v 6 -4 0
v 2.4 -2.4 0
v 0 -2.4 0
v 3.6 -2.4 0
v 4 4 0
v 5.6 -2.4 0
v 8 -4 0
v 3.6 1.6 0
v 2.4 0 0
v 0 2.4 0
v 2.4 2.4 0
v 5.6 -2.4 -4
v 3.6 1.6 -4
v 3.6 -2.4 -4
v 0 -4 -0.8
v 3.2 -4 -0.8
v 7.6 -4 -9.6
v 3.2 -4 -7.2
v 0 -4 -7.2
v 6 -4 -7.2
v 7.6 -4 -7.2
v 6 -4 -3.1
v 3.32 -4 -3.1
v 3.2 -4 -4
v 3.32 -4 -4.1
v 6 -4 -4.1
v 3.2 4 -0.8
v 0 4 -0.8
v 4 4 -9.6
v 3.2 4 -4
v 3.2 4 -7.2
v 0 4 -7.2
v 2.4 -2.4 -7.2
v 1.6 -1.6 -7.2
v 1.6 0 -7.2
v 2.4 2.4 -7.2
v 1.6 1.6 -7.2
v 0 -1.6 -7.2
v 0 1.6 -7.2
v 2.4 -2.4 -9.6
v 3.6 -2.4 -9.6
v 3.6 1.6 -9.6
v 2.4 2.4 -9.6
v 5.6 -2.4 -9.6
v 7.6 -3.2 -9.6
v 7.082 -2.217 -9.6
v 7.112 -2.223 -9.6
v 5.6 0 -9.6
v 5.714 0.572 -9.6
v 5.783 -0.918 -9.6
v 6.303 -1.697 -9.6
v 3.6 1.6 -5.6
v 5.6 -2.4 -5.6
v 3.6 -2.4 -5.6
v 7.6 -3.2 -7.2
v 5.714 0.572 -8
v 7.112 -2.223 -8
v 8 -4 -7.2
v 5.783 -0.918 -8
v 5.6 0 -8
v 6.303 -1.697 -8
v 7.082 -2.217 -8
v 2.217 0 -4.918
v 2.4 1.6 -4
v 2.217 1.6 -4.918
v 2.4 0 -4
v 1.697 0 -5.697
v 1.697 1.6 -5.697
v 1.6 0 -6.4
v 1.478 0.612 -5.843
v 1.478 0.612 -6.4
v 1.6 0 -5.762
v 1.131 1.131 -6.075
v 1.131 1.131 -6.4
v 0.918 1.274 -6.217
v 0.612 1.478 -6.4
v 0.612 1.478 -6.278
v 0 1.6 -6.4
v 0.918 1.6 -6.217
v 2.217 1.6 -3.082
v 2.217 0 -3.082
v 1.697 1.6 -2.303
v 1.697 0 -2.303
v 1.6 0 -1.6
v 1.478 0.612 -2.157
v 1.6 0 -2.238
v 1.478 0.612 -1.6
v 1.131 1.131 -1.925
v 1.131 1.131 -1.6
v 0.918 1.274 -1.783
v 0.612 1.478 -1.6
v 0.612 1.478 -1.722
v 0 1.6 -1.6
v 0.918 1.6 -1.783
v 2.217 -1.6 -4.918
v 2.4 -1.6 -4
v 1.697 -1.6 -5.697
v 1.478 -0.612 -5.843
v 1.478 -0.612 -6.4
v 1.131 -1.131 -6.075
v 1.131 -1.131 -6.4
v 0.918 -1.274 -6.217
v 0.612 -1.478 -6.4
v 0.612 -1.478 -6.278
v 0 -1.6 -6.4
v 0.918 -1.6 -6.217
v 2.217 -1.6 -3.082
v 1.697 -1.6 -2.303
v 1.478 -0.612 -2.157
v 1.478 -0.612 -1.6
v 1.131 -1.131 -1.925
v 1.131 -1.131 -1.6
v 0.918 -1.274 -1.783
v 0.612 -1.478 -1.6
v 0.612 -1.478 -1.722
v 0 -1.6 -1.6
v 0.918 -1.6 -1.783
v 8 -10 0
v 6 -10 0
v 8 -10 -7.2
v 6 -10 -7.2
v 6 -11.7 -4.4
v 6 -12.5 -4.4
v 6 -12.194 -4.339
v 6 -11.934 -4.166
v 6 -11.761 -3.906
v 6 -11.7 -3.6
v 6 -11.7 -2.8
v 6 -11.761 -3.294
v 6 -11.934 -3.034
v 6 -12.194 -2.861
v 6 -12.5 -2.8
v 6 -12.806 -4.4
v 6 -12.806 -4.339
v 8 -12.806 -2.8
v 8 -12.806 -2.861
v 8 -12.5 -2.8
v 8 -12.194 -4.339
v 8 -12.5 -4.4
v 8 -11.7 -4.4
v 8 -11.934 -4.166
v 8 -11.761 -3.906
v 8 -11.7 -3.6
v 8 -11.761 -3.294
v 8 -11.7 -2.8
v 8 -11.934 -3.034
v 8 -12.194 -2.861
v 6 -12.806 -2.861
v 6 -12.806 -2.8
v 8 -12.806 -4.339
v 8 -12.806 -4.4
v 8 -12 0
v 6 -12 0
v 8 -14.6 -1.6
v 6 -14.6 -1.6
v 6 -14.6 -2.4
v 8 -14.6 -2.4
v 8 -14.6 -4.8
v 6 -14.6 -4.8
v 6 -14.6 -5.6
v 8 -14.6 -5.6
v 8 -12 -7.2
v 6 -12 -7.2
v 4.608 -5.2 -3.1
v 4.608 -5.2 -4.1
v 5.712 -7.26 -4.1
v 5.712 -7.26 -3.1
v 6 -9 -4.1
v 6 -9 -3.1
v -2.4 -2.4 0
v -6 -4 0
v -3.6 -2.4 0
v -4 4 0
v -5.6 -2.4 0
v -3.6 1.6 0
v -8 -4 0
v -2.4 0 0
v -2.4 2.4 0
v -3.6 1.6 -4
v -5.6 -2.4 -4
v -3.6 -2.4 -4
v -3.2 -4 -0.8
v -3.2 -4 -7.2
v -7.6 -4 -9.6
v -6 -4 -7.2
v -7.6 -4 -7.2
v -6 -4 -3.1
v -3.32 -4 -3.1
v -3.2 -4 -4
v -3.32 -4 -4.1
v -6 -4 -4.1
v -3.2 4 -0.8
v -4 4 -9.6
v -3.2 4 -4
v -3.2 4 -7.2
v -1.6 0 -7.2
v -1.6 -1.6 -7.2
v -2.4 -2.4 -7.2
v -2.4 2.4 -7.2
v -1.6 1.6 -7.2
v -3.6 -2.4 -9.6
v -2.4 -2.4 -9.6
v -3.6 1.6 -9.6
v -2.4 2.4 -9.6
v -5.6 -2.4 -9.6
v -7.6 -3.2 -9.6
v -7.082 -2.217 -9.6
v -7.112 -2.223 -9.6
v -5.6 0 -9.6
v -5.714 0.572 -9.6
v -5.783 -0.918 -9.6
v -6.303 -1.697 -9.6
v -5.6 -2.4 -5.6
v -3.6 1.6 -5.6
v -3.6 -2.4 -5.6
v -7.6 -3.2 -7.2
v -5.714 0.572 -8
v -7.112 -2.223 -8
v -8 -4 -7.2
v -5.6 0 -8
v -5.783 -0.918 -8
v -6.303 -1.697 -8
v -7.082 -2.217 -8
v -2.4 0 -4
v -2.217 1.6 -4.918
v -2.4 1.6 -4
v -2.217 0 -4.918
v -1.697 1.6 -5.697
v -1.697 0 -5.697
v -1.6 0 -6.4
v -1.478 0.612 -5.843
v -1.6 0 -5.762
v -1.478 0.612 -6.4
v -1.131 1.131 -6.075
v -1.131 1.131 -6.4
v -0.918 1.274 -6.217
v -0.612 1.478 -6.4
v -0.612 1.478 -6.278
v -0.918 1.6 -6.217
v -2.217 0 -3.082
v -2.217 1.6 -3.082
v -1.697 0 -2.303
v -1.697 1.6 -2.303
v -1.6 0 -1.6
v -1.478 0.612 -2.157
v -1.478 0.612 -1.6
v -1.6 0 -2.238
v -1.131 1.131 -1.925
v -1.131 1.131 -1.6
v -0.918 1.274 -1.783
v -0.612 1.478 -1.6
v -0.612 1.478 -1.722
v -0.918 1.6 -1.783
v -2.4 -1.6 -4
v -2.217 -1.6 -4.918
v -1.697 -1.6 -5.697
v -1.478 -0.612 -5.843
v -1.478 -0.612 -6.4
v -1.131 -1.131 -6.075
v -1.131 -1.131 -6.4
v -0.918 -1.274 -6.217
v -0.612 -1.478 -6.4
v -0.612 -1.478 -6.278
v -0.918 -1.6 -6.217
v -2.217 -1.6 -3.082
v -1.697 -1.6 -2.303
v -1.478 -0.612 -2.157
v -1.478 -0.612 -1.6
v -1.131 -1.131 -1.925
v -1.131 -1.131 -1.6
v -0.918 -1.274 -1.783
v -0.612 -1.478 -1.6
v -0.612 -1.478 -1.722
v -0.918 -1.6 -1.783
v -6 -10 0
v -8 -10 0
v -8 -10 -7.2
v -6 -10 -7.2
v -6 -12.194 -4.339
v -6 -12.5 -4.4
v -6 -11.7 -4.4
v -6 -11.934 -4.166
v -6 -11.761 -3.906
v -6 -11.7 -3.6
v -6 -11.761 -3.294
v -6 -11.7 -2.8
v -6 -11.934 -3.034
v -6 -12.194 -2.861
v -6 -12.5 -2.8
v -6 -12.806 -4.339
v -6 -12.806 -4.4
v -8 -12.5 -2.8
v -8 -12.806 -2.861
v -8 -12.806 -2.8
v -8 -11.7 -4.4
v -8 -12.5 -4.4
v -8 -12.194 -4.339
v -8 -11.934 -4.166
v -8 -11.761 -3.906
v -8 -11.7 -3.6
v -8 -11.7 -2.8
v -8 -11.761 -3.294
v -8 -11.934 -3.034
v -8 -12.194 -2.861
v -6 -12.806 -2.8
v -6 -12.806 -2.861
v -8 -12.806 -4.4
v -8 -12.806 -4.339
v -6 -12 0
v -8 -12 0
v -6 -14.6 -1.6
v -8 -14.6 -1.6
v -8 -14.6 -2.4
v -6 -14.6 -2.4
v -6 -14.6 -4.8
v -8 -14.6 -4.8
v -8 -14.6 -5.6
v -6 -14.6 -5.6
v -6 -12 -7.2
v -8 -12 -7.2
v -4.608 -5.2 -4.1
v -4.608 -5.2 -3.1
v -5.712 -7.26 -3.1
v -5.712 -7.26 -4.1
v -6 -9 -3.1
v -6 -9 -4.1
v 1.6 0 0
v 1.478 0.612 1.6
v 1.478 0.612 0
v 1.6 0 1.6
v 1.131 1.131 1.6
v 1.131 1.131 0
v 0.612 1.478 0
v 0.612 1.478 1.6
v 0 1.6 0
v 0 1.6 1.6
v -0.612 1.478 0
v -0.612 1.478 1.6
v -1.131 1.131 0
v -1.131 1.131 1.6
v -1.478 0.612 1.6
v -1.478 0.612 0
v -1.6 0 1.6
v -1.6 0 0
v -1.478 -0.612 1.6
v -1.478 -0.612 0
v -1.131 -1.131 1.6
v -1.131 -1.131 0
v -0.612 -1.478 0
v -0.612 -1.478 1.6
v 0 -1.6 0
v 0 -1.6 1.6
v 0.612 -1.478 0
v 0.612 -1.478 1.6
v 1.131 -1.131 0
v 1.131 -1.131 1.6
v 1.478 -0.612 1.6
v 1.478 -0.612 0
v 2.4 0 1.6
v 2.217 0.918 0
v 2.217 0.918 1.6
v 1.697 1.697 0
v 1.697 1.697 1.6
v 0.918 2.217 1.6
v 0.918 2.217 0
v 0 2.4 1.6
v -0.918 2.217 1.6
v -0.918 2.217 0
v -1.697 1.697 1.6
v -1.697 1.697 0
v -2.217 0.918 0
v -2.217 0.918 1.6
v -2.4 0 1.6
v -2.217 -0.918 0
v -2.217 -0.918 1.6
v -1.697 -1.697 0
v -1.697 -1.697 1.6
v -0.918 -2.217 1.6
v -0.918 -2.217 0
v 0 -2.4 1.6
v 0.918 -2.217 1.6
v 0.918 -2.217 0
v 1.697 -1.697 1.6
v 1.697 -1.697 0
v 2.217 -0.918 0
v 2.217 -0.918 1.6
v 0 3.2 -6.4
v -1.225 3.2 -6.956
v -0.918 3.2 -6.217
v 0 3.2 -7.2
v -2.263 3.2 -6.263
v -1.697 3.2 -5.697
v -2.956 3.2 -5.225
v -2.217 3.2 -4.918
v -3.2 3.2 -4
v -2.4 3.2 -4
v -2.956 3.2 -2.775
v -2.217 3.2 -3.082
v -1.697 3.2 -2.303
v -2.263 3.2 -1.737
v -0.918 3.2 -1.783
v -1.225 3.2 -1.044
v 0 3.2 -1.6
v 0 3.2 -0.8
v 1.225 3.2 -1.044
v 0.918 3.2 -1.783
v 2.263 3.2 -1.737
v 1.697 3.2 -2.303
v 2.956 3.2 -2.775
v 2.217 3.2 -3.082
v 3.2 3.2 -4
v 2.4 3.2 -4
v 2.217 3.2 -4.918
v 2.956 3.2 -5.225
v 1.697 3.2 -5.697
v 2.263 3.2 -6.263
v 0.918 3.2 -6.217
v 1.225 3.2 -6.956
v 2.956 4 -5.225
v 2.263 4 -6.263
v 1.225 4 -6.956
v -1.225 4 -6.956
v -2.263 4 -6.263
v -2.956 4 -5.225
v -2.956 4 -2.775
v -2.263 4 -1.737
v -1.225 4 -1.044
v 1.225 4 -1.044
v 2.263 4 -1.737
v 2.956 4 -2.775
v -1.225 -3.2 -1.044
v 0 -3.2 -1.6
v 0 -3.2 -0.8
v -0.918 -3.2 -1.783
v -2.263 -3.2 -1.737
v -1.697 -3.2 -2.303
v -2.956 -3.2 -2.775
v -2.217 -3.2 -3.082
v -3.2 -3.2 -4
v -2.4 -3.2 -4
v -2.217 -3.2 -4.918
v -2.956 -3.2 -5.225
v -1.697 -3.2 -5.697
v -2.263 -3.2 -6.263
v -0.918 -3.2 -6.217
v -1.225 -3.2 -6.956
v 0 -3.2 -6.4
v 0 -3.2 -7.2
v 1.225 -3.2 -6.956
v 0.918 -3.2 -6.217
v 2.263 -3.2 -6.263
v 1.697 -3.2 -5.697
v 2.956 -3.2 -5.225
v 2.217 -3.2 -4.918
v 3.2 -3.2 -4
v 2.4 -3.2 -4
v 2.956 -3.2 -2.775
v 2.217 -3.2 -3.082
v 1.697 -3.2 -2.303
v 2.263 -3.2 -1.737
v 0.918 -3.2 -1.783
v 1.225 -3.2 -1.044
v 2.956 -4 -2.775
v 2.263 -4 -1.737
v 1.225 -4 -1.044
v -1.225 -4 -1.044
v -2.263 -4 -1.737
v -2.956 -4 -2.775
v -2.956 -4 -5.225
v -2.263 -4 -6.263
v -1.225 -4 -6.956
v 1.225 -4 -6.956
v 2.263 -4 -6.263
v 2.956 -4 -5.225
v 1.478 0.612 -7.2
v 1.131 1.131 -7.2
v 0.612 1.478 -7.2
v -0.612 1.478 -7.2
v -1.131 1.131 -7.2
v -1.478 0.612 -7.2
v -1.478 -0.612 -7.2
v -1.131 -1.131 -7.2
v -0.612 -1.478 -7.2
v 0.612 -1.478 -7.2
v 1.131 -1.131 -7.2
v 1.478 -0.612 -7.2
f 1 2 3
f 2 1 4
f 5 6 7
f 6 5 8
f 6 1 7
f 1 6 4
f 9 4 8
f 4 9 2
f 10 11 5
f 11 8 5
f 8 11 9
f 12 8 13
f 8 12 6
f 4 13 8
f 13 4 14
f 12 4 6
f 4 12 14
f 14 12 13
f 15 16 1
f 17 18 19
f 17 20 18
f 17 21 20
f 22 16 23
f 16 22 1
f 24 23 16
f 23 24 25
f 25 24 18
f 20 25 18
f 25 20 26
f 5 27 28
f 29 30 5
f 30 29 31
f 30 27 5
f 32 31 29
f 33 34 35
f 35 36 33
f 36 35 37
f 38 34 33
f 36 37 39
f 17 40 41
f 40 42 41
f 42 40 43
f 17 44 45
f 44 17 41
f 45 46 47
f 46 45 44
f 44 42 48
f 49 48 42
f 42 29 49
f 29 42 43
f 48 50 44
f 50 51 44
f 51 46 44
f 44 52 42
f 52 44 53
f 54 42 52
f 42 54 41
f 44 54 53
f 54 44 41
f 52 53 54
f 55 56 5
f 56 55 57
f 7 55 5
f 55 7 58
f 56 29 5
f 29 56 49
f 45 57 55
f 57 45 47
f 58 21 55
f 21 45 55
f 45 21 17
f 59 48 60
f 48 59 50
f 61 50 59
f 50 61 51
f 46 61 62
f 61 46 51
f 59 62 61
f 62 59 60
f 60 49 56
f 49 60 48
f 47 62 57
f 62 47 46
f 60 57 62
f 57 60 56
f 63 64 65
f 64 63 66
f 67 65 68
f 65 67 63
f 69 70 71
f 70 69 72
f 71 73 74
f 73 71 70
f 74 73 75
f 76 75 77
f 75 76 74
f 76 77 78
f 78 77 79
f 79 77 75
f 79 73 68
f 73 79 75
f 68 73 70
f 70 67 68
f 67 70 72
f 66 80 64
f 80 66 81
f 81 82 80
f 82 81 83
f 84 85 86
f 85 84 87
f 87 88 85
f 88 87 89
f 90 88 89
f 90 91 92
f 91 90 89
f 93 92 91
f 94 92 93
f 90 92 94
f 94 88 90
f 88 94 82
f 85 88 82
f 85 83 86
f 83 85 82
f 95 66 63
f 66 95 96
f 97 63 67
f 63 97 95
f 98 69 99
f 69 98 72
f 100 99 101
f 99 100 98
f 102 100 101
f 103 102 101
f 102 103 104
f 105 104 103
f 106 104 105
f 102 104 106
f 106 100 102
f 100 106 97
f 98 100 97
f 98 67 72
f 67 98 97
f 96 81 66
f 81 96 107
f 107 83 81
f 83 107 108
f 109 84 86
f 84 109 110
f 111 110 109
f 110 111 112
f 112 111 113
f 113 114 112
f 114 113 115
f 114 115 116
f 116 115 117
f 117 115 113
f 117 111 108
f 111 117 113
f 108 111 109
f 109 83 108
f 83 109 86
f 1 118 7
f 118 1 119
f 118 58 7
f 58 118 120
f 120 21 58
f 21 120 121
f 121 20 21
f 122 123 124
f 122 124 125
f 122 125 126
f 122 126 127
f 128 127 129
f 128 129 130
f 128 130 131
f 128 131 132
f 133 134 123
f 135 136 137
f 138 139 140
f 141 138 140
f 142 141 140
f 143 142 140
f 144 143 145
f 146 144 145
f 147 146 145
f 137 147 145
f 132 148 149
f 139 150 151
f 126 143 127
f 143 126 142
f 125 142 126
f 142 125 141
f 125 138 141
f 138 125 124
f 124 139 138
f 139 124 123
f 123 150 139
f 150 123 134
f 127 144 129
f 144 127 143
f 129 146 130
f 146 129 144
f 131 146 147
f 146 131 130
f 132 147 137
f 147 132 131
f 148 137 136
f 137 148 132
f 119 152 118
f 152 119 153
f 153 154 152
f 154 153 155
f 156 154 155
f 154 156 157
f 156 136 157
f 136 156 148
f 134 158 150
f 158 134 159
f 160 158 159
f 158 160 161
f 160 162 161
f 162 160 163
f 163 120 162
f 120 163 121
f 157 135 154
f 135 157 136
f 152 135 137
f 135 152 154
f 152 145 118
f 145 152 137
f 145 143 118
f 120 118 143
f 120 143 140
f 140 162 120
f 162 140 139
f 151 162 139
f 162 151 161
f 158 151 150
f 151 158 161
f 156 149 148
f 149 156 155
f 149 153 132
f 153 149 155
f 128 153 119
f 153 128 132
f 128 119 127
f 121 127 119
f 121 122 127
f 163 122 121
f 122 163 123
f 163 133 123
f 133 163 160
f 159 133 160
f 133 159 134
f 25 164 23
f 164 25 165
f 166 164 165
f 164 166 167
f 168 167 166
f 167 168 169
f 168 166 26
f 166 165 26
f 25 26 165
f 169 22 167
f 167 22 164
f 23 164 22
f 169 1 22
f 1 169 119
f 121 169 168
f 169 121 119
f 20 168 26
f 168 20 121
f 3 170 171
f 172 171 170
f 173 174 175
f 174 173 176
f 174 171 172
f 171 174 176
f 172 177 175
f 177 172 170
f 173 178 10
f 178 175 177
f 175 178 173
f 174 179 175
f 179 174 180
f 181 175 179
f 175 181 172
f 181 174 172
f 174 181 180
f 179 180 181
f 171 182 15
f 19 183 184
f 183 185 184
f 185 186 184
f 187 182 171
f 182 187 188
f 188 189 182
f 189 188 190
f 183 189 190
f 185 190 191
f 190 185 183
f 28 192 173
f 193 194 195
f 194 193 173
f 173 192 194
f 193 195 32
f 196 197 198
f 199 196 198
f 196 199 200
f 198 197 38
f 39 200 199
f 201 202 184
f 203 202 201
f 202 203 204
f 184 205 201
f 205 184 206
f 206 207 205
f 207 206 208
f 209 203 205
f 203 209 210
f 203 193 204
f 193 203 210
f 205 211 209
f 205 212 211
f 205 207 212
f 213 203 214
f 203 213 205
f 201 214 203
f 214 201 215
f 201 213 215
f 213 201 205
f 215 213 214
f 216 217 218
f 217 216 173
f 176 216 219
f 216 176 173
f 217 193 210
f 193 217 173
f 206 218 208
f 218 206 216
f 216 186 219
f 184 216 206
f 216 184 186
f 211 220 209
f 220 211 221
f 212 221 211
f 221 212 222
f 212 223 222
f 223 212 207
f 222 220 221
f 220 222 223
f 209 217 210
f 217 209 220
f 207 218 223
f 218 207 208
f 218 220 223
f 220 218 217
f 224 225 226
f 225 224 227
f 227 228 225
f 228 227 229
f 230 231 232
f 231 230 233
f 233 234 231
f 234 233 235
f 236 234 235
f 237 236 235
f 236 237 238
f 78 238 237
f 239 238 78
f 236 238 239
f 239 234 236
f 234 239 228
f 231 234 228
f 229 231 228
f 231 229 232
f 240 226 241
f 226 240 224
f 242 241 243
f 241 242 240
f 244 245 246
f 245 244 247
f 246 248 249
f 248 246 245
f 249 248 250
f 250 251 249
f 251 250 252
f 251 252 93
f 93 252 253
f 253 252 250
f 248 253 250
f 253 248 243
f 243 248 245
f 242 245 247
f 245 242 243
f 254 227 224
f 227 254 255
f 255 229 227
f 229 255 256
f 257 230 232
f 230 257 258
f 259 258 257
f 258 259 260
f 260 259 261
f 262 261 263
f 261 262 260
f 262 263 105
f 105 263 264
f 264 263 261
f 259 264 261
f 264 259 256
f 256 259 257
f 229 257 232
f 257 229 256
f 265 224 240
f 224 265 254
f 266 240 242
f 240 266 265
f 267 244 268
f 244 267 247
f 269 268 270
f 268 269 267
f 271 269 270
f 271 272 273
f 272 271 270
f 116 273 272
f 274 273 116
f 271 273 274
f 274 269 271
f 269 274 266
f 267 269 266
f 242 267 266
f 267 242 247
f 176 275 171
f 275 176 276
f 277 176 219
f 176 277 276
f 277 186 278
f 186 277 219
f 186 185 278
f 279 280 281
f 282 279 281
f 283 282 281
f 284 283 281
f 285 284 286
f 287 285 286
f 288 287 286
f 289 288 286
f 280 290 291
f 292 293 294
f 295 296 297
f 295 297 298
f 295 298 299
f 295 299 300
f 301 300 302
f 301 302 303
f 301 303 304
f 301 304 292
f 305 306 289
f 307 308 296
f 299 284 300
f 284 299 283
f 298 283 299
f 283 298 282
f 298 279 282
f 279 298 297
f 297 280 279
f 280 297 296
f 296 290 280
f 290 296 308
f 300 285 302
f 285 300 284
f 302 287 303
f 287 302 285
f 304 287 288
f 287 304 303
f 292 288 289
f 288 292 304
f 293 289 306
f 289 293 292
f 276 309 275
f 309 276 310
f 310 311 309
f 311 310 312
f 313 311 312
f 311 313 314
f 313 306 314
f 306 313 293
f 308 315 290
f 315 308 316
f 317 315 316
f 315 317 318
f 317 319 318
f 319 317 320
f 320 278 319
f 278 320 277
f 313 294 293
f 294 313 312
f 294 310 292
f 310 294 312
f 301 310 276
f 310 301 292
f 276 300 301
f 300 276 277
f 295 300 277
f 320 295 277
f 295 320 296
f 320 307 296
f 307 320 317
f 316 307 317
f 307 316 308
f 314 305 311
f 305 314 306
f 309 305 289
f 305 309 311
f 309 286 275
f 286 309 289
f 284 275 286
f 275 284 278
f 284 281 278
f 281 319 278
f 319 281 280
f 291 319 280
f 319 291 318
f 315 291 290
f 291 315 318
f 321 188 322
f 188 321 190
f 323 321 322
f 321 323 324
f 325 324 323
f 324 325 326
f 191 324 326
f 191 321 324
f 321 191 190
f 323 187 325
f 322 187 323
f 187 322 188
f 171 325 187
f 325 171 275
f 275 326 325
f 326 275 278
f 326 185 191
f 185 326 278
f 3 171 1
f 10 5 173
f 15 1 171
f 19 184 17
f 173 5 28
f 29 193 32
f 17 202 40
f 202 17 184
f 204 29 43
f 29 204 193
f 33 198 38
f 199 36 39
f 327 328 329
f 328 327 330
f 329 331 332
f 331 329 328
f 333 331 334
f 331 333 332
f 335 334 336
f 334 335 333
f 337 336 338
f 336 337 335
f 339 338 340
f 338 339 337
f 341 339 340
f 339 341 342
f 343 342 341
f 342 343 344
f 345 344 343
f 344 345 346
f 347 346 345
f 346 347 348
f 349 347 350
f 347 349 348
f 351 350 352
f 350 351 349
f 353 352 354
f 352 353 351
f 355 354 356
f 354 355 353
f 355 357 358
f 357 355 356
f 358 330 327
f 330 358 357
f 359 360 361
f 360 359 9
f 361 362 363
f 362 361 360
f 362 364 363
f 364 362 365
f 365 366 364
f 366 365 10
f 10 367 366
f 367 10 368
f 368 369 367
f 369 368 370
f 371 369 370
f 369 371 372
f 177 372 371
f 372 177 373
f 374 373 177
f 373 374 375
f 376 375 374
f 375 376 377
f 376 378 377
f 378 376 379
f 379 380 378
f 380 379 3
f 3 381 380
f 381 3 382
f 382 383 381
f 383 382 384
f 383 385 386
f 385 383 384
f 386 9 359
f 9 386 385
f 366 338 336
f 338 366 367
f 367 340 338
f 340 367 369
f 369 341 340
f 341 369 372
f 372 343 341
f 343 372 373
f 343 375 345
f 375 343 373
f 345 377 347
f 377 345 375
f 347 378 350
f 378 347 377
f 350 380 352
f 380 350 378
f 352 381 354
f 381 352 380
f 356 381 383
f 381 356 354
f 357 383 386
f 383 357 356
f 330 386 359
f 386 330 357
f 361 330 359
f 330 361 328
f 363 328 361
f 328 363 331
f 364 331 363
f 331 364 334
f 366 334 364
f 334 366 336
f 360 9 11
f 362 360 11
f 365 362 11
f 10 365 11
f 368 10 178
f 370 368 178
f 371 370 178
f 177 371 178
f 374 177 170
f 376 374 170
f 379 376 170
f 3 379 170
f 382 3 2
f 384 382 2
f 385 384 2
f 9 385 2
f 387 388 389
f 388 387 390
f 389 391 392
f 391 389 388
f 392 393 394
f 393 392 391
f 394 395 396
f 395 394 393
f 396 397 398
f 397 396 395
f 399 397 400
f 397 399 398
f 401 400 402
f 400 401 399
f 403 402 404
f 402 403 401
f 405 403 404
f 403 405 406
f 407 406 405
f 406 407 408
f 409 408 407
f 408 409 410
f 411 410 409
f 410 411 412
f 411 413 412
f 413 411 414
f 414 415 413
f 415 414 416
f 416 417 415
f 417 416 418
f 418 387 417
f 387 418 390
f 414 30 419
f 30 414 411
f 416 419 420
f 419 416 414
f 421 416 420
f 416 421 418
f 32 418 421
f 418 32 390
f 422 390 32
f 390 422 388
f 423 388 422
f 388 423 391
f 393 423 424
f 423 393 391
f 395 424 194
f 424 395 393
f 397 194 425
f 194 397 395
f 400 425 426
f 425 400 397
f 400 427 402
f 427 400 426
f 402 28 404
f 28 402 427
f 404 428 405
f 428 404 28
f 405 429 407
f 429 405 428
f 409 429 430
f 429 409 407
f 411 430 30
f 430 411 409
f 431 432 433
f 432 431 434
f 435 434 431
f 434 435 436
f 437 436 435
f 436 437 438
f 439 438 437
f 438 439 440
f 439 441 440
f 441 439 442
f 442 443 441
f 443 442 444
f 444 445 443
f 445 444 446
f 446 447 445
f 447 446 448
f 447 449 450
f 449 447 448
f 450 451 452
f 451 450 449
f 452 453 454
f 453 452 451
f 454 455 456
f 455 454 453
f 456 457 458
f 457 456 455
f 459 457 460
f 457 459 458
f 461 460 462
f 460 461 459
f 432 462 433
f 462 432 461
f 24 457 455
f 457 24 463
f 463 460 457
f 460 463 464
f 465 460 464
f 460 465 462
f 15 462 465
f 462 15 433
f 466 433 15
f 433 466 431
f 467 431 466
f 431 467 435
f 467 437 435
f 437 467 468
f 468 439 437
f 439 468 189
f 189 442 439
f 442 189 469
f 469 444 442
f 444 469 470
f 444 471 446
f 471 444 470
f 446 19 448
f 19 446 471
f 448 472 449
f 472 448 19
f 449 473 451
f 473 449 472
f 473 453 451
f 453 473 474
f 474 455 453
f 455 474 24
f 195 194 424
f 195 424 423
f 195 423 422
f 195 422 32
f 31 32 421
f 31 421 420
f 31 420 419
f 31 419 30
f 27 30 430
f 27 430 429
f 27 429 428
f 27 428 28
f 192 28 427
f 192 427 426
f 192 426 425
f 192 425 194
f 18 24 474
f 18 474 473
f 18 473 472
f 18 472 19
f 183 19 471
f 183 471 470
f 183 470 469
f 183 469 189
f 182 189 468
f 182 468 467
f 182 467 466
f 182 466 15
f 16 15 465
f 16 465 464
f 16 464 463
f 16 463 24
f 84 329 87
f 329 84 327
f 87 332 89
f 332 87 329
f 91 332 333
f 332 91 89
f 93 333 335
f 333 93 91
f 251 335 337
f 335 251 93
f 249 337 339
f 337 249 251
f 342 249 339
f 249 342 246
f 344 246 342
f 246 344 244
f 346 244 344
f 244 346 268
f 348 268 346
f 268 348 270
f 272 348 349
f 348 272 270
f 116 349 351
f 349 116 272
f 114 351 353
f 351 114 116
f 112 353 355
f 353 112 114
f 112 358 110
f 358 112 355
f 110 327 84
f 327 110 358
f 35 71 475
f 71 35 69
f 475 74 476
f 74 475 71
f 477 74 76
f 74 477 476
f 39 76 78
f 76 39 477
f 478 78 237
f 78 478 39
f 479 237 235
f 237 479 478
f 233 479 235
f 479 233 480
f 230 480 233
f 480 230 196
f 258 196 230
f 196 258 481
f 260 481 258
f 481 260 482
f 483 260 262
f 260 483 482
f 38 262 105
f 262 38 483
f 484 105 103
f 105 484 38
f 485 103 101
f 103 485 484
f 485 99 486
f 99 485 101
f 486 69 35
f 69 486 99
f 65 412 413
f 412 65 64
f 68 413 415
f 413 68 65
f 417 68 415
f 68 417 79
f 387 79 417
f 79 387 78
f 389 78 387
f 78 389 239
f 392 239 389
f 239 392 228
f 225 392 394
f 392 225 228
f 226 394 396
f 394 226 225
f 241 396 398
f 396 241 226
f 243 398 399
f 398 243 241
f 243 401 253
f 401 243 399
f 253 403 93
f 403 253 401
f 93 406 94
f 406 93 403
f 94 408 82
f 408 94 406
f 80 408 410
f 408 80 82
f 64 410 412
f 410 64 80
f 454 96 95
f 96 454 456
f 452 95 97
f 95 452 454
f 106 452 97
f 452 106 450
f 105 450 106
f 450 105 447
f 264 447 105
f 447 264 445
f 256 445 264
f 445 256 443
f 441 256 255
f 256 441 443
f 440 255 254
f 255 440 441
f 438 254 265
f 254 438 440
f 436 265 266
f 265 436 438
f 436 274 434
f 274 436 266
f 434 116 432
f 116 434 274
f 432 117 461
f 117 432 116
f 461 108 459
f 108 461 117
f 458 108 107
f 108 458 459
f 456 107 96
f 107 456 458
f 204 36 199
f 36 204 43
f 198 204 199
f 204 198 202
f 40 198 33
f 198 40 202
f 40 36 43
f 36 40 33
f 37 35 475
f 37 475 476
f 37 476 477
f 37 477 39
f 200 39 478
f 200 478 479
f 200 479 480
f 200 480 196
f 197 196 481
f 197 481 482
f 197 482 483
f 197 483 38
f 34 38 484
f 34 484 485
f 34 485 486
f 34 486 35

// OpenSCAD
use <../lib.scad>
use <../p/4-4cyli.scad>
use <../p/4-4edge.scad>
use <../p/4-4ndis.scad>
use <../p/box4.scad>
use <../p/peghole.scad>
use <s/2607bs01.scad>
use <../p/stud2a.scad>
function ldraw_lib__2607b() = [
// 0 Magnet Holder  2 x  3 Technic Brick
// 0 Name: 2607b.dat
// 0 Author: Rene Rechthaler [Blechtaler]
// 0 !LDRAW_ORG Part UPDATE 2025-06
// 0 !LICENSE Licensed under CC BY 4.0 : see CAreadme.txt
// 
// 0 !HELP place magnet 2959bc01 at 0 9 -31.25
// 0 !HELP 1 16 0 0 0 1 0 0 0 1 0 0 0 1 2607b.dat
// 0 !HELP 1 16 0 9 -31.25 1 0 0 0 1 0 0 0 1 2959bc01.dat (horizontal)
// 0 !HELP 1 0 0 9 -31.25 1 0 0 0 0 1 0 1 0 2959bc01.dat (vertical)
// 
// 0 BFC CERTIFY CCW
  [0,"BFC","CERTIFY"],
  [0,"BFC","CCW"],
// 
// 0 !KEYWORDS BrickLink 2607, Rebrickable 2607
// 
// 0 !HISTORY 2025-03-23 [Blechtaler] reworked to fit the magnet better
// 0 !HISTORY 2025-06-26 [OrionP] Official Update 2025-06
// 
// 1 16 0 0 0 1 0 0 0 1 0 0 0 1 s\2607bs01.dat
  [1,16,0,0,0,1,0,0,0,1,0,0,0,1, ldraw_lib__s__2607bs01()],
// 1 16 0 0 0 -1 0 0 0 1 0 0 0 1 s\2607bs01.dat
  [1,16,0,0,0,-1,0,0,0,1,0,0,0,1, ldraw_lib__s__2607bs01()],
// 0 // seam
// 3 16 0 0 -6 -15 0 -10 15 0 -10
  [3,16,0,0,-6,-15,0,-10,15,0,-10],
// 3 16 0 0 6 10 0 10 -10 0 10
  [3,16,0,0,6,10,0,10,-10,0,10],
// 2 24 -15 0 -10 15 0 -10
  [2,24,-15,0,-10,15,0,-10],
// 2 24 -10 0 10 10 0 10
  [2,24,-10,0,10,10,0,10],
// 3 16 0 2 -10 15 0 -10 -15 0 -10
  [3,16,0,2,-10,15,0,-10,-15,0,-10],
// 3 16 0 18 -10 -19 24 -10 19 24 -10
  [3,16,0,18,-10,-19,24,-10,19,24,-10],
// 3 16 -10 0 10 10 0 10 0 2 10
  [3,16,-10,0,10,10,0,10,0,2,10],
// 3 16 10 24 10 -10 24 10 0 18 10
  [3,16,10,24,10,-10,24,10,0,18,10],
// 4 16 19 24 -10 -19 24 -10 -6 24 -6 6 24 -6
  [4,16,19,24,-10,-19,24,-10,-6,24,-6,6,24,-6],
// 4 16 -10 24 10 10 24 10 6 24 6 -6 24 6
  [4,16,-10,24,10,10,24,10,6,24,6,-6,24,6],
// 2 24 -19 24 -10 19 24 -10
  [2,24,-19,24,-10,19,24,-10],
// 2 24 10 24 10 -10 24 10
  [2,24,10,24,10,-10,24,10],
// 3 16 6 18 -6 -6 18 -6 0 18 -4
  [3,16,6,18,-6,-6,18,-6,0,18,-4],
// 3 16 -6 18 6 6 18 6 0 18 4
  [3,16,-6,18,6,6,18,6,0,18,4],
// 0 // top stud
// 1 16 0 0 0 1 0 0 0 1 0 0 0 1 stud2a.dat
  [1,16,0,0,0,1,0,0,0,1,0,0,0,1, ldraw_lib__stud2a()],
// 1 16 0 0 0 6 0 0 0 1 0 0 0 6 4-4edge.dat
  [1,16,0,0,0,6,0,0,0,1,0,0,0,6, ldraw_lib__4_4edge()],
// 1 16 0 0 0 6 0 0 0 1 0 0 0 6 4-4ndis.dat
  [1,16,0,0,0,6,0,0,0,1,0,0,0,6, ldraw_lib__4_4ndis()],
// 0 // intersection
// 1 16 0 10 10 1 0 0 0 0 1 0 -1 0 peghole.dat
  [1,16,0,10,10,1,0,0,0,0,1,0,-1,0, ldraw_lib__peghole()],
// 1 16 0 10 -10 1 0 0 0 0 -1 0 1 0 peghole.dat
  [1,16,0,10,-10,1,0,0,0,0,-1,0,1,0, ldraw_lib__peghole()],
// 1 16 0 10 10 -8 0 0 0 0 8 0 -1 0 4-4ndis.dat
  [1,16,0,10,10,-8,0,0,0,0,8,0,-1,0, ldraw_lib__4_4ndis()],
// 1 16 0 10 -10 8 0 0 0 0 8 0 1 0 4-4ndis.dat
  [1,16,0,10,-10,8,0,0,0,0,8,0,1,0, ldraw_lib__4_4ndis()],
// 0 BFC INVERTNEXT
  [0,"BFC","INVERTNEXT"],
// 1 16 0 0 0 4 0 0 0 4 0 0 0 4 4-4cyli.dat
  [1,16,0,0,0,4,0,0,0,4,0,0,0,4, ldraw_lib__4_4cyli()],
// 0 BFC INVERTNEXT
  [0,"BFC","INVERTNEXT"],
// 1 16 0 16 0 4 0 0 0 2 0 0 0 4 4-4cyli.dat
  [1,16,0,16,0,4,0,0,0,2,0,0,0,4, ldraw_lib__4_4cyli()],
// 0 BFC INVERTNEXT
  [0,"BFC","INVERTNEXT"],
// 1 16 0 10 4 6 0 0 0 0 6 0 4 0 4-4cyli.dat
  [1,16,0,10,4,6,0,0,0,0,6,0,4,0, ldraw_lib__4_4cyli()],
// 0 BFC INVERTNEXT
  [0,"BFC","INVERTNEXT"],
// 1 16 0 10 -4 6 0 0 0 0 6 0 -4 0 4-4cyli.dat
  [1,16,0,10,-4,6,0,0,0,0,6,0,-4,0, ldraw_lib__4_4cyli()],
// 0 BFC INVERTNEXT
  [0,"BFC","INVERTNEXT"],
// 1 16 0 18 0 6 0 0 0 6 0 0 0 6 box4.dat
  [1,16,0,18,0,6,0,0,0,6,0,0,0,6, ldraw_lib__box4()],
// 1 16 0 18 0 4 0 0 0 -1 0 0 0 4 4-4ndis.dat
  [1,16,0,18,0,4,0,0,0,-1,0,0,0,4, ldraw_lib__4_4ndis()],
// 1 16 0 18 0 4 0 0 0 1 0 0 0 4 4-4edge.dat
  [1,16,0,18,0,4,0,0,0,1,0,0,0,4, ldraw_lib__4_4edge()],
];
module ldraw_lib__2607b(step=0, col=false, unit=2/5, alt=false, line=0.2, solid=!$preview)
    makepoly(ldraw_lib__2607b(), step=step, col=col, unit=unit, alt=alt, line=line, solid=solid);
ldraw_lib__2607b(line=0.2);
